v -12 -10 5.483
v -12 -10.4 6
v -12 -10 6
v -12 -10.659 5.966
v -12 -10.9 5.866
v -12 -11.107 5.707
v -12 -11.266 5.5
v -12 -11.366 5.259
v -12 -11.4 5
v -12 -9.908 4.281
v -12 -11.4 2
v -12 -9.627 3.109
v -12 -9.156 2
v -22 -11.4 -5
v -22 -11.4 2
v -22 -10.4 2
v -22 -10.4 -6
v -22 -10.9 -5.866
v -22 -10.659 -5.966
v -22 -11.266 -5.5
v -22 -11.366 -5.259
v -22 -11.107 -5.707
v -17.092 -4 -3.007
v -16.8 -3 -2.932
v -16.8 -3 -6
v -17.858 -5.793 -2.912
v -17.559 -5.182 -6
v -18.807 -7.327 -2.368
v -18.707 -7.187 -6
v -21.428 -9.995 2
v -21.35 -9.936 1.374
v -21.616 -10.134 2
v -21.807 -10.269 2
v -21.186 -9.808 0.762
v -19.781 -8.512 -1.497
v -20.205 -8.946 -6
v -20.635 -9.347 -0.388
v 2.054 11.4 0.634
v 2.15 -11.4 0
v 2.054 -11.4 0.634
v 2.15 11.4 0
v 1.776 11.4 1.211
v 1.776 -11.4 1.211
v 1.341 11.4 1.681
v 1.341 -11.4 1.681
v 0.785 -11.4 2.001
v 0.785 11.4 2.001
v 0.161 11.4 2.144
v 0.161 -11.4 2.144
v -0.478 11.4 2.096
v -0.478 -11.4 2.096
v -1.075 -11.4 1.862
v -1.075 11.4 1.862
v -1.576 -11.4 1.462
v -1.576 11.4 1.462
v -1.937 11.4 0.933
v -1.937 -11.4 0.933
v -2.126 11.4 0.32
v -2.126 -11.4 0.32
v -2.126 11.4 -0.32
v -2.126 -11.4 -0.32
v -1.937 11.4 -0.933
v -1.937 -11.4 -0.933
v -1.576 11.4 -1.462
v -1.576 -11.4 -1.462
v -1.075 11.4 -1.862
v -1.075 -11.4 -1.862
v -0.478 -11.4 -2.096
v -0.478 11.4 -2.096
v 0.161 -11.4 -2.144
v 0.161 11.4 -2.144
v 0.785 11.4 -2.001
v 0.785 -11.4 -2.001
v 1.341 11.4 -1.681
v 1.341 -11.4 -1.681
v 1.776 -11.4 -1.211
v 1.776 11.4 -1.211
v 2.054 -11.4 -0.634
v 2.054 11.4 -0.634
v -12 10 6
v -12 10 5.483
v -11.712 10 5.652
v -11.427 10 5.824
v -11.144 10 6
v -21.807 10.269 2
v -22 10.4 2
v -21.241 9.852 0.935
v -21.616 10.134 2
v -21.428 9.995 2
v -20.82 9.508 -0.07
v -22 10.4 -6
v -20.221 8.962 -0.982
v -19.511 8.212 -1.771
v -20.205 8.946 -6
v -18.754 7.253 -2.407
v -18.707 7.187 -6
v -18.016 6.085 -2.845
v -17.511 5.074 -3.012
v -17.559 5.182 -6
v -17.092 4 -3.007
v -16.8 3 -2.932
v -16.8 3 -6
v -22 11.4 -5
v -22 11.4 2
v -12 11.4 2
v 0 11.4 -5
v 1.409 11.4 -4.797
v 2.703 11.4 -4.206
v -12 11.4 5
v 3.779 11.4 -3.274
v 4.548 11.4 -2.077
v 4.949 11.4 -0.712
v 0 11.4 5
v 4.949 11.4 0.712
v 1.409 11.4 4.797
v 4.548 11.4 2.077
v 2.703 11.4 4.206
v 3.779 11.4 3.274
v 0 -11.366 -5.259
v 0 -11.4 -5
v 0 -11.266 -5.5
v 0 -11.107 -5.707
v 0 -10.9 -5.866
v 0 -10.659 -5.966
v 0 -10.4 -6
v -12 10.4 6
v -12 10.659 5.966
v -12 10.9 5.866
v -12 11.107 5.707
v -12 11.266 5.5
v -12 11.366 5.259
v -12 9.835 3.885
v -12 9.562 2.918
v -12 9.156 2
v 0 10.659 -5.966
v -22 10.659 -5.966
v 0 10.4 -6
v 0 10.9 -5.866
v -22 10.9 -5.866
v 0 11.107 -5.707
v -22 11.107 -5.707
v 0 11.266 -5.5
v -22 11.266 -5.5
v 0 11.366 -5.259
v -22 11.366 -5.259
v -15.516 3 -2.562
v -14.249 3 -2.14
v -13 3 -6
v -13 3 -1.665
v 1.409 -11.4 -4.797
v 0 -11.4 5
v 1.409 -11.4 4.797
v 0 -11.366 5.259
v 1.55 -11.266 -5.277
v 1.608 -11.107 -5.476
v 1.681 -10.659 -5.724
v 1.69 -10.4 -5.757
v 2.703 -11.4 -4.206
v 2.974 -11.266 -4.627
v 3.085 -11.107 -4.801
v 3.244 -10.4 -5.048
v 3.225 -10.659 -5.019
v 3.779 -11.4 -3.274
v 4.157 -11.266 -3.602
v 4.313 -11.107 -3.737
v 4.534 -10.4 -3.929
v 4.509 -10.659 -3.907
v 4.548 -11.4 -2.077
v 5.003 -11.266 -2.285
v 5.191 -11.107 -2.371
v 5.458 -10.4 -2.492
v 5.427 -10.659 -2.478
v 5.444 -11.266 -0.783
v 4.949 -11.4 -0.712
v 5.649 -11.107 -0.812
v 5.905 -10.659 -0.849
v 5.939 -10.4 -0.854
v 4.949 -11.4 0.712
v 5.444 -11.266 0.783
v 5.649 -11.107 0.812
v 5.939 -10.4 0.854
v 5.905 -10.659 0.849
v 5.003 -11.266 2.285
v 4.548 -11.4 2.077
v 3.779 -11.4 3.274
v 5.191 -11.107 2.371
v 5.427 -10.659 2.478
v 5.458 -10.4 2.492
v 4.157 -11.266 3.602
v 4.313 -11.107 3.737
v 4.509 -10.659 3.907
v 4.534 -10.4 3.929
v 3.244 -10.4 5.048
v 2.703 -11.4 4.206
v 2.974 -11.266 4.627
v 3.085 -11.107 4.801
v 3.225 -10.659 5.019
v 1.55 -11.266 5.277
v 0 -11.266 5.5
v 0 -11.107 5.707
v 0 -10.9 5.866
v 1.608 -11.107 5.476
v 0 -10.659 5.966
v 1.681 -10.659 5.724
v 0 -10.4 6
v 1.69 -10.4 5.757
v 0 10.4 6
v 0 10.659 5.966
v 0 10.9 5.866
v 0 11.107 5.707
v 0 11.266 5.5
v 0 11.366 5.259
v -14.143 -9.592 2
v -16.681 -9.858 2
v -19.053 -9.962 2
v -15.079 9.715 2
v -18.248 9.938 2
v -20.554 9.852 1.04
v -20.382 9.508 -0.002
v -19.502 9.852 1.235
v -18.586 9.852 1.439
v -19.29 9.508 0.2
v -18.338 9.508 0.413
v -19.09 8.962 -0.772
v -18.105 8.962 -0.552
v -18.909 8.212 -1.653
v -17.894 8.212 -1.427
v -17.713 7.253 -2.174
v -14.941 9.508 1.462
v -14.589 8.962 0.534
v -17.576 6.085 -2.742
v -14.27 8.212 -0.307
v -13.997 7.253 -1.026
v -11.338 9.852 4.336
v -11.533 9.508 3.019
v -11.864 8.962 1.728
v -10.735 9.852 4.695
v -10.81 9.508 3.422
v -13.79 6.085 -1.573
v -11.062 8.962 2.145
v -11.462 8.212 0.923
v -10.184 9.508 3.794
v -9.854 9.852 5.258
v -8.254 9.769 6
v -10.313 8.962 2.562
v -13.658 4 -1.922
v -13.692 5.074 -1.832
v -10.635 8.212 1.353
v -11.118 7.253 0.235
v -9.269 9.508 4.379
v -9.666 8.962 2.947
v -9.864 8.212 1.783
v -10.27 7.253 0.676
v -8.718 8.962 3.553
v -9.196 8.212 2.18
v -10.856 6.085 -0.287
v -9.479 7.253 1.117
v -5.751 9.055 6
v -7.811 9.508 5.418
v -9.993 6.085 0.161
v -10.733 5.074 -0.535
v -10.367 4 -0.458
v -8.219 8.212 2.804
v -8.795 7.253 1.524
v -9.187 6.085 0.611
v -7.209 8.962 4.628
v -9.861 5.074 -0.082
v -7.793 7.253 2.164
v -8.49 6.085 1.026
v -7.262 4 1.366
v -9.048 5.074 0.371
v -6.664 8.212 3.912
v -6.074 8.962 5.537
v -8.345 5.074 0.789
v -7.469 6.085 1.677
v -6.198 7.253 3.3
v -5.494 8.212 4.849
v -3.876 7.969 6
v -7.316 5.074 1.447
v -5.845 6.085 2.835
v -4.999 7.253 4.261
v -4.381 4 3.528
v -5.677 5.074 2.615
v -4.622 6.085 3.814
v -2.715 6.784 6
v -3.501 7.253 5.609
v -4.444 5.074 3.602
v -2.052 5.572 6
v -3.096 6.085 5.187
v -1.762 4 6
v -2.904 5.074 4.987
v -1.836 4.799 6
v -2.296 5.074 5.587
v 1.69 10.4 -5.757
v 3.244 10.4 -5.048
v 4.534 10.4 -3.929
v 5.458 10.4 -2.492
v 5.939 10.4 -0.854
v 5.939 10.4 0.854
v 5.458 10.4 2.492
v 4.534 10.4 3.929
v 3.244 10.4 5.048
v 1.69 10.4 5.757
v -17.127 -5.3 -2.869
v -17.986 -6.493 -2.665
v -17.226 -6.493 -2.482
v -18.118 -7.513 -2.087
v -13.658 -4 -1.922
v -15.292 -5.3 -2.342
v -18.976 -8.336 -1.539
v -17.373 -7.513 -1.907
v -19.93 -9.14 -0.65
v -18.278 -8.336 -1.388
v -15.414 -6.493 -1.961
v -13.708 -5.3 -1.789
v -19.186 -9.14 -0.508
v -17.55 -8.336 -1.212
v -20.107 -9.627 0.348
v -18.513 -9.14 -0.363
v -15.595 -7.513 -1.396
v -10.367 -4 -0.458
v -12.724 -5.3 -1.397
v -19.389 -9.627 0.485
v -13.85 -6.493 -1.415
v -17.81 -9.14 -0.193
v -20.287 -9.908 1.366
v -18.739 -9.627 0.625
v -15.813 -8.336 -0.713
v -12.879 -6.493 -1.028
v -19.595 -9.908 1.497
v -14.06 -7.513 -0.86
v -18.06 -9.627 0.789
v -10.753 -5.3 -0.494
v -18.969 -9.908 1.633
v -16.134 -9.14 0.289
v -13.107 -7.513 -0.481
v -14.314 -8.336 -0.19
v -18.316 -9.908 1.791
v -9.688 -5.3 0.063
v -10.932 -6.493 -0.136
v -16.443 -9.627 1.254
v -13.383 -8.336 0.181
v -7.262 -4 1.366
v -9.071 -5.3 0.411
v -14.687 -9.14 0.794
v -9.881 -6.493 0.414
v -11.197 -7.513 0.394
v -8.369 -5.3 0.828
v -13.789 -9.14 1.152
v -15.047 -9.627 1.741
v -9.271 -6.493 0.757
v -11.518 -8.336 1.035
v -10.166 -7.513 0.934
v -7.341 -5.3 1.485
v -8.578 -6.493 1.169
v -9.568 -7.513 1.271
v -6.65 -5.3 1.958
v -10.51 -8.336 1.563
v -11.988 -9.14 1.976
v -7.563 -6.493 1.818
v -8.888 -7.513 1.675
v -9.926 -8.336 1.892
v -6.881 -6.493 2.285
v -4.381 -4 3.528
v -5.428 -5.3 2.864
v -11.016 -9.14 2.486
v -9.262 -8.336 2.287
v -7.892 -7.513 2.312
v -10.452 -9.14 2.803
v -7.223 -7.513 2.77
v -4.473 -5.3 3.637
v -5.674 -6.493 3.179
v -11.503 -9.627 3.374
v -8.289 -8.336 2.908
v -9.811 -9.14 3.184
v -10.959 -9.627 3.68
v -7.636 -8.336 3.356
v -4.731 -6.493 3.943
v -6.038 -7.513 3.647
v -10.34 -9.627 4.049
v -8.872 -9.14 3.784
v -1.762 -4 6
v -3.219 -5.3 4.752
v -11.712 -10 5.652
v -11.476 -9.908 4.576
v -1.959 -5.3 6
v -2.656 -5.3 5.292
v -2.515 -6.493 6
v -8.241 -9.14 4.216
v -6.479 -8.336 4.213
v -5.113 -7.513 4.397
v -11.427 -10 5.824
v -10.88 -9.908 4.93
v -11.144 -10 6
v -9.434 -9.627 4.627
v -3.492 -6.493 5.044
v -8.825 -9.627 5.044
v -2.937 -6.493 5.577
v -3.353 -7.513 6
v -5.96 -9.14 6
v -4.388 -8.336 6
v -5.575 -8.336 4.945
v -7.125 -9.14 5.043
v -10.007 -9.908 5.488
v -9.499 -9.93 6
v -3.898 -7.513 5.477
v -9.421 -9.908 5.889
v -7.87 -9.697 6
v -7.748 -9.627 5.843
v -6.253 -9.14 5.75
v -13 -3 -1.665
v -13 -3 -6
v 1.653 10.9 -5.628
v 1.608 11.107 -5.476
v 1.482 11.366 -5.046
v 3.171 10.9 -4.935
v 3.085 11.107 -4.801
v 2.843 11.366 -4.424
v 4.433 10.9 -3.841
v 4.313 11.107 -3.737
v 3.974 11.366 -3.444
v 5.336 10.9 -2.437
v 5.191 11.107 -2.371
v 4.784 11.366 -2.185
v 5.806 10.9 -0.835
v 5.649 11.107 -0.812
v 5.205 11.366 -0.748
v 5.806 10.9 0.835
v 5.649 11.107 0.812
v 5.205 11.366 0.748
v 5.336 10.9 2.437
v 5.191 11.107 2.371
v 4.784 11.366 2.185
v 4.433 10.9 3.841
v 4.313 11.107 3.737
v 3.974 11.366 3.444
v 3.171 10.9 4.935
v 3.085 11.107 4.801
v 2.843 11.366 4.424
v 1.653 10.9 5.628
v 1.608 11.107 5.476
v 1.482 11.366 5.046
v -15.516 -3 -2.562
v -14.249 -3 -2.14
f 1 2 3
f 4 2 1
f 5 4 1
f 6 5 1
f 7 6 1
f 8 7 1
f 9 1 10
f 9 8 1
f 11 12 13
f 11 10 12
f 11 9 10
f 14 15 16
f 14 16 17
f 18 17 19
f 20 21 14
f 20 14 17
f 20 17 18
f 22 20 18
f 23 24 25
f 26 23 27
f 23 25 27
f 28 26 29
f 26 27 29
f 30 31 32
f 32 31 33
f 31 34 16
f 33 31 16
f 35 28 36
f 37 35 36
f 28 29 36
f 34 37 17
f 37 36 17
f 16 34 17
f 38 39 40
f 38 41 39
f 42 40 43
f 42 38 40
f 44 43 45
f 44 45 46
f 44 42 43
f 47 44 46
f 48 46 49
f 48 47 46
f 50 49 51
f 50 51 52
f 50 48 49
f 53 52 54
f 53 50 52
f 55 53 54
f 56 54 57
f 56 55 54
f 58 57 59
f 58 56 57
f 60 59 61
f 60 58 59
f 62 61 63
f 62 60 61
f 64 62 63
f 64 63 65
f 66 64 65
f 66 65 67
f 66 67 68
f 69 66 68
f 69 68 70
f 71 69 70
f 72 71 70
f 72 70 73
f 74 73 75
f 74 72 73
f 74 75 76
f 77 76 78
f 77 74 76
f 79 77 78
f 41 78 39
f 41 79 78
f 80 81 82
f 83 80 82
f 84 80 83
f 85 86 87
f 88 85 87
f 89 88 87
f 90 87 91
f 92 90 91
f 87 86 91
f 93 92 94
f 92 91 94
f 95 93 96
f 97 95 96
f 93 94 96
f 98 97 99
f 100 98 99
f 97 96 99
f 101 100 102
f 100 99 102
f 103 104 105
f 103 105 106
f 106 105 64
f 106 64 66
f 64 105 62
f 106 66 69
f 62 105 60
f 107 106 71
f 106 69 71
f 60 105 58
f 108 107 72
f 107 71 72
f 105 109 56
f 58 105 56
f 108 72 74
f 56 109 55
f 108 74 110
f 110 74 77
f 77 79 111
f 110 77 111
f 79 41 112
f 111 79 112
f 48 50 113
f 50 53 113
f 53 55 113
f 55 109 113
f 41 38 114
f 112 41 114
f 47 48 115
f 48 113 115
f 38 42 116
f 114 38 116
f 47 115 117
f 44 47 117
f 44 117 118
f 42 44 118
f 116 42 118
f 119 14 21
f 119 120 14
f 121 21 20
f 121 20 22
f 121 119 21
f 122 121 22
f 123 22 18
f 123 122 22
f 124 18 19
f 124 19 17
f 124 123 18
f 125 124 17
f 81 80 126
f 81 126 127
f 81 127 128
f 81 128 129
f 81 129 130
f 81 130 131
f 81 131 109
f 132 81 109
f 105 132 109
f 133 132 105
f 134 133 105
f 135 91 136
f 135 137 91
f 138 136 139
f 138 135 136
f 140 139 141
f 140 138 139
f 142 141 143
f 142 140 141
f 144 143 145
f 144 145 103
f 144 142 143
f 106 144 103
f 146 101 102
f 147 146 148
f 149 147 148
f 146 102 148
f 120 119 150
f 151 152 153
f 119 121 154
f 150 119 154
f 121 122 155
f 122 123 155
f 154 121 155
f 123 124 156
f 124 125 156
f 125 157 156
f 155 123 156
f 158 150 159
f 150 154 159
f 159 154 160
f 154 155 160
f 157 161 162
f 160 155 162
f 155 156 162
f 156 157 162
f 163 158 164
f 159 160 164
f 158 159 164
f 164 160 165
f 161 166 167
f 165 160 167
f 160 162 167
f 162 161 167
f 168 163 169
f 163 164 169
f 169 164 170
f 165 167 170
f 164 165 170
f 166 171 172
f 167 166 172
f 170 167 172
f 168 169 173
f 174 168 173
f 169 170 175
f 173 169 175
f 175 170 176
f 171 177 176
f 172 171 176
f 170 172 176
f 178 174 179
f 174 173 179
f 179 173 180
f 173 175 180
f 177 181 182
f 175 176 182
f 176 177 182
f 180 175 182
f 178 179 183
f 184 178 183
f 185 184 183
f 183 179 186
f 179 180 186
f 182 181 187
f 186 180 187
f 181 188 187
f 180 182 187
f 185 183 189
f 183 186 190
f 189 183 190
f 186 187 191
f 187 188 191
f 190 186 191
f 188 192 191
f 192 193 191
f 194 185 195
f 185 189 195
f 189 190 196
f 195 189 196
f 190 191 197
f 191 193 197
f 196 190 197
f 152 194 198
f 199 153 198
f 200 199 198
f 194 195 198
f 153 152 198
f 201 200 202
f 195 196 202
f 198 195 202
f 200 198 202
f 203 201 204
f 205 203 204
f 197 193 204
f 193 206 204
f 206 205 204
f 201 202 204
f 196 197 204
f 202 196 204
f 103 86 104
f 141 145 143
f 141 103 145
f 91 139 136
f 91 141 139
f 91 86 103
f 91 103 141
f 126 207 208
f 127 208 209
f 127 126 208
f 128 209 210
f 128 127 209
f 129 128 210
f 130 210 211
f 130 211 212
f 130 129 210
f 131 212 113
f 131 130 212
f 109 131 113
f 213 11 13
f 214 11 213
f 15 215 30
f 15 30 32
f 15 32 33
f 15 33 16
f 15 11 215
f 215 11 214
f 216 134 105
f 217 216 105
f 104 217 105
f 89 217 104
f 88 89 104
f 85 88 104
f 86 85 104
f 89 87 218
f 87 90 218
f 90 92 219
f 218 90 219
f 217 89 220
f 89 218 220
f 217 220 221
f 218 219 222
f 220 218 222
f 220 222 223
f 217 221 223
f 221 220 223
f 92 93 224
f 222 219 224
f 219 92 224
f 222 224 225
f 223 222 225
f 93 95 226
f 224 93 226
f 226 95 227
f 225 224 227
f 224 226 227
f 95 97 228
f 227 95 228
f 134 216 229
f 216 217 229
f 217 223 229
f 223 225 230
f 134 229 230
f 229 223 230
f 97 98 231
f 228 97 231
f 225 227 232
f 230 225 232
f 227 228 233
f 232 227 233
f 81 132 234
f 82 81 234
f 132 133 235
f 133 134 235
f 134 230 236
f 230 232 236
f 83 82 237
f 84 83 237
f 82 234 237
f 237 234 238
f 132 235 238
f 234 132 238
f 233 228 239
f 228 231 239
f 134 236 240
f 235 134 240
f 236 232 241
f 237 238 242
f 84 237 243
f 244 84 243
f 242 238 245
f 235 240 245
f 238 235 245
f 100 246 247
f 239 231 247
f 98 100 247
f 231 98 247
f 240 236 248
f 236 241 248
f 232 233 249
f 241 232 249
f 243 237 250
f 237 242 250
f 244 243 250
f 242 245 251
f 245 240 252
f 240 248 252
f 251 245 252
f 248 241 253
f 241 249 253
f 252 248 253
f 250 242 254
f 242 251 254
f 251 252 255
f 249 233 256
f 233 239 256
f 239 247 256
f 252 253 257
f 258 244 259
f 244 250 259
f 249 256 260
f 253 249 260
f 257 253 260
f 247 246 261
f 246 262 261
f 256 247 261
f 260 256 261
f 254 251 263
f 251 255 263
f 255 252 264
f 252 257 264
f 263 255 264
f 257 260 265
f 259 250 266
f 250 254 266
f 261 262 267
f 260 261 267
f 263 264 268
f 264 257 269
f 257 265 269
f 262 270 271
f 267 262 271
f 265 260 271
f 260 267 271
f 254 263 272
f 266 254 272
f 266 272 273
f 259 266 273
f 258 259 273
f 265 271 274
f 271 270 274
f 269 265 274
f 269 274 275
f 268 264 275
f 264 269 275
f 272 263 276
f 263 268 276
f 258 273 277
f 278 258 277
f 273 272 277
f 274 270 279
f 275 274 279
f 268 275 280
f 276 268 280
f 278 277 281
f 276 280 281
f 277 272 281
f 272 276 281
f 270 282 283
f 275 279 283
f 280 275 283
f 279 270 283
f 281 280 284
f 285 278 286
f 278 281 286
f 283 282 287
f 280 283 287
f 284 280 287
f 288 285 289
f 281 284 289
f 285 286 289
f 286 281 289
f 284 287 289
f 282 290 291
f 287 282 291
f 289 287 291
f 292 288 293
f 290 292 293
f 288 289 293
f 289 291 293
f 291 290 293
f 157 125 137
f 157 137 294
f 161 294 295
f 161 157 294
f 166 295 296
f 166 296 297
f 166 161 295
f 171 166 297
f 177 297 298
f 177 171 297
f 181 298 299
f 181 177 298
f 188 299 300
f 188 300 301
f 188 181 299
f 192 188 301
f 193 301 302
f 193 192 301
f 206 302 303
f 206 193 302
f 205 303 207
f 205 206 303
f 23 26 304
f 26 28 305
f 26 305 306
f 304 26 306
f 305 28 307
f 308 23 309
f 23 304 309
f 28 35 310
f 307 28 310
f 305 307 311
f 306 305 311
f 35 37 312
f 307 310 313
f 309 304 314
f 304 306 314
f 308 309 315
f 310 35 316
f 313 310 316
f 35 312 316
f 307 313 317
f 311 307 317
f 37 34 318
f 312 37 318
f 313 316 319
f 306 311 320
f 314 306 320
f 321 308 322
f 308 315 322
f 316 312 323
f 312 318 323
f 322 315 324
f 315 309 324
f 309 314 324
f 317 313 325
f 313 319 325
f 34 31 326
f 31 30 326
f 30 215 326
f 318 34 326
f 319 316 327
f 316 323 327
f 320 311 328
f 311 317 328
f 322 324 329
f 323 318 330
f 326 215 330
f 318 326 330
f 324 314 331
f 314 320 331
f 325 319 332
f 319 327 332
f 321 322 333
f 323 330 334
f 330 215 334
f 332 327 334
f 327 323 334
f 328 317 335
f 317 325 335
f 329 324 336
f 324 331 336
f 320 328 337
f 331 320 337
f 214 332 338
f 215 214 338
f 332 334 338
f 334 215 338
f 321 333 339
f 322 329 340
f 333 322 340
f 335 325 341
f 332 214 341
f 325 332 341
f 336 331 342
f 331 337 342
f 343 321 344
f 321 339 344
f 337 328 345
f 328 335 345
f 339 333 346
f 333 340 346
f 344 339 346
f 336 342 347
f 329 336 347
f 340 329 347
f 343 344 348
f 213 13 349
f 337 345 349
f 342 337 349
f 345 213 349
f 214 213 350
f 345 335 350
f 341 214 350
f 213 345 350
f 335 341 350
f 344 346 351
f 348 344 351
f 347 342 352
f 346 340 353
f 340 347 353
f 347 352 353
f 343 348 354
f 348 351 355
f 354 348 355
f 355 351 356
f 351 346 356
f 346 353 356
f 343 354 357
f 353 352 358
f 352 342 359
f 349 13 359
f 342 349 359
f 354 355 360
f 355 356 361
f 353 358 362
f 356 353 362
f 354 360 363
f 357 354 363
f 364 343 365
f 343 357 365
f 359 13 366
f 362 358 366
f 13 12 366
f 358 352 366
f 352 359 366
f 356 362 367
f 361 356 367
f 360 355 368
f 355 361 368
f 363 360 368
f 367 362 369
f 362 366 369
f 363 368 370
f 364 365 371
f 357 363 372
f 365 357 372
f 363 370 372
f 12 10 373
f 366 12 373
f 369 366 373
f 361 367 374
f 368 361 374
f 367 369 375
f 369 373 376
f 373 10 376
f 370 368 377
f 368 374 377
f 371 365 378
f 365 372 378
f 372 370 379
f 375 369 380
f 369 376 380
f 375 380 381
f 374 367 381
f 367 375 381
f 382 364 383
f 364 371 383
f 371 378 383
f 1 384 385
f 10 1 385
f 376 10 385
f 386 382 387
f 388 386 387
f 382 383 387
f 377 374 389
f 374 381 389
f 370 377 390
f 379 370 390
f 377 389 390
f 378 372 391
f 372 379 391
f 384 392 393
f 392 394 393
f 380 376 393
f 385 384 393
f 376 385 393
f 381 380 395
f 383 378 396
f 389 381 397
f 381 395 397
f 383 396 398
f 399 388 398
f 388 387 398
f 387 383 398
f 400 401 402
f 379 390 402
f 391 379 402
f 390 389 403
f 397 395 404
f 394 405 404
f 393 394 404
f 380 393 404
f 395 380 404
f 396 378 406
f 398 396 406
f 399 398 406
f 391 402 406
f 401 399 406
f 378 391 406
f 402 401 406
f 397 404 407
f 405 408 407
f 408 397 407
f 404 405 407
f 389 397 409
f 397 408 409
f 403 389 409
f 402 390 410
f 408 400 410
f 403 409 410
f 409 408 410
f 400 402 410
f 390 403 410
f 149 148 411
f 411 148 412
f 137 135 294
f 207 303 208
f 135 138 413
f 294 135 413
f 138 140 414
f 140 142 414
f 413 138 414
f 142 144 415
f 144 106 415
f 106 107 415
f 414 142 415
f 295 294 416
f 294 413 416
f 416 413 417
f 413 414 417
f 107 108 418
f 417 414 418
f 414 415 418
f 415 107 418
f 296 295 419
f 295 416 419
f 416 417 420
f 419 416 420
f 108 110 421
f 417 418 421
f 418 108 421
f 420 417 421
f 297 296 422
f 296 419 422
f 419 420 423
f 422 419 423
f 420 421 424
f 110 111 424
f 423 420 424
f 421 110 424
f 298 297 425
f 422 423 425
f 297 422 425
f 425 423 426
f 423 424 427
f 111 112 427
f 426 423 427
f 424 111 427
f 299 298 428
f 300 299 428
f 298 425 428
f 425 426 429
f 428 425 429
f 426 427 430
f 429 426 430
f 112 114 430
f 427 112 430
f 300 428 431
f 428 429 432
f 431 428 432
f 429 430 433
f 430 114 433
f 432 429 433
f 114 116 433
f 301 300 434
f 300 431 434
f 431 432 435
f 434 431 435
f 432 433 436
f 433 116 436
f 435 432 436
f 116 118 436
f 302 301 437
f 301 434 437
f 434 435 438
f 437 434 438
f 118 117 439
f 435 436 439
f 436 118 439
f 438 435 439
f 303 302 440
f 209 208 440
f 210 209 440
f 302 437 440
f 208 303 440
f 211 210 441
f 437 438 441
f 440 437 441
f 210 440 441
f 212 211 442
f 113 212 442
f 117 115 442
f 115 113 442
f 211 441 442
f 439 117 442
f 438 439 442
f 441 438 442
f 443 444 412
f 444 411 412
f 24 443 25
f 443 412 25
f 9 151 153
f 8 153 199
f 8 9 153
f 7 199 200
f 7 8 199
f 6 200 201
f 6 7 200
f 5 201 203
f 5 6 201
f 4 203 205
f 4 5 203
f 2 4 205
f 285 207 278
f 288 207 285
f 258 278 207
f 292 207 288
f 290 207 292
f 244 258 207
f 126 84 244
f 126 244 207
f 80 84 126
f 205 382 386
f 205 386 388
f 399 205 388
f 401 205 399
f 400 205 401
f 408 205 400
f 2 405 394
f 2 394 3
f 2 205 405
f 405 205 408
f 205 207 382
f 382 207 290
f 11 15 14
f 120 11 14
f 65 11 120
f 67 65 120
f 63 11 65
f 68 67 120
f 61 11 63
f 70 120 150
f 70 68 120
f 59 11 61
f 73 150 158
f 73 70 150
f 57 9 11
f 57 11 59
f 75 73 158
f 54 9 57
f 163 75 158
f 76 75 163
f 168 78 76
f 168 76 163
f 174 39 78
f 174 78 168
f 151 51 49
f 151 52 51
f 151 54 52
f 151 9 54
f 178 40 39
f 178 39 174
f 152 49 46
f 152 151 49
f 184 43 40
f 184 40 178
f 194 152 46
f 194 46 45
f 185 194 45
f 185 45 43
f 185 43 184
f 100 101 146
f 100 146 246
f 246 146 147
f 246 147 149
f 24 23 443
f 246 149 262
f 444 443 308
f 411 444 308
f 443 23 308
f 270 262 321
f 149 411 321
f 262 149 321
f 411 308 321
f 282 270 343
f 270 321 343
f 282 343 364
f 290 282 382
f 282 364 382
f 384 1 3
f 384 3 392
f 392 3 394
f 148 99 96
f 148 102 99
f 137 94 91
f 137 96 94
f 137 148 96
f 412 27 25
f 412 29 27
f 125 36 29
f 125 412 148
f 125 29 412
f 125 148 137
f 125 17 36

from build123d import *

# Parameters (mm, degrees)
F0_R     = 2.15
F1_DEPTH = 11.4
F3_DEPTH = 10
F4_R     = 6
F6_DEPTH = 25
F7_R     = 1


with BuildPart() as f1:
    # F0 (on Front) → F1 (new body, symmetric)
    with BuildSketch(Plane.XZ):
        with BuildLine():
            Line((-22, -6), (0, -6))
            ThreePointArc((0, -6), (6, 0), (0, 6))
            Line((0, 6), (-12, 6))
            Line((-12, 6), (-12, 2))
            Line((-12, 2), (-22, 2))
            Line((-22, 2), (-22, -6))
        make_face()
        Circle(F0_R, mode=Mode.SUBTRACT)
    extrude(amount=F1_DEPTH, both=True)

    # F2 (on Front) → F3 (cut, symmetric)
    with BuildSketch(Plane.XZ):
        with BuildLine():
            Line((-26.315558, 9.79657), (-26.315558, -3.972946))
            ThreePointArc((-26.315558, -3.972946), (-10.728351, -0.64123), (1.317963, 9.79657))
            Line((1.317963, 9.79657), (-26.315558, 9.79657))
        make_face()
    extrude(amount=F3_DEPTH, both=True, mode=Mode.SUBTRACT)

    # F4
    f4_edges = [f1.edges().sort_by_distance(p)[0] for p in [
        (-10.985467, 10, -0.767914),
        (-10.985467, -10, -0.767914),
    ]]
    fillet(f4_edges, radius=F4_R)

    # F5 (on face) → F6 (cut)
    with BuildSketch(Plane(origin=(0, 0, -6), x_dir=(1, 0, 0), z_dir=(0, 0, -1))):
        with BuildLine():
            Line((-13, 3), (-16.800034, 3))
            ThreePointArc((-16.800034, 3), (-18.707277, 7.186787), (-22, 10.4))
            Line((-22, 10.4), (-22, -10.4))
            ThreePointArc((-22, -10.4), (-18.707277, -7.186787), (-16.800034, -3))
            Line((-16.800034, -3), (-13, -3))
            Line((-13, -3), (-13, 3))
        make_face()
    extrude(amount=-F6_DEPTH, mode=Mode.SUBTRACT)

    # F7
    f7_edges = [f1.edges().sort_by_distance(p)[0] for p in [
        (-6, -11.4, 6),
        (-11, 11.4, -6),
    ]]
    fillet(f7_edges, radius=F7_R)


solid = f1.part
